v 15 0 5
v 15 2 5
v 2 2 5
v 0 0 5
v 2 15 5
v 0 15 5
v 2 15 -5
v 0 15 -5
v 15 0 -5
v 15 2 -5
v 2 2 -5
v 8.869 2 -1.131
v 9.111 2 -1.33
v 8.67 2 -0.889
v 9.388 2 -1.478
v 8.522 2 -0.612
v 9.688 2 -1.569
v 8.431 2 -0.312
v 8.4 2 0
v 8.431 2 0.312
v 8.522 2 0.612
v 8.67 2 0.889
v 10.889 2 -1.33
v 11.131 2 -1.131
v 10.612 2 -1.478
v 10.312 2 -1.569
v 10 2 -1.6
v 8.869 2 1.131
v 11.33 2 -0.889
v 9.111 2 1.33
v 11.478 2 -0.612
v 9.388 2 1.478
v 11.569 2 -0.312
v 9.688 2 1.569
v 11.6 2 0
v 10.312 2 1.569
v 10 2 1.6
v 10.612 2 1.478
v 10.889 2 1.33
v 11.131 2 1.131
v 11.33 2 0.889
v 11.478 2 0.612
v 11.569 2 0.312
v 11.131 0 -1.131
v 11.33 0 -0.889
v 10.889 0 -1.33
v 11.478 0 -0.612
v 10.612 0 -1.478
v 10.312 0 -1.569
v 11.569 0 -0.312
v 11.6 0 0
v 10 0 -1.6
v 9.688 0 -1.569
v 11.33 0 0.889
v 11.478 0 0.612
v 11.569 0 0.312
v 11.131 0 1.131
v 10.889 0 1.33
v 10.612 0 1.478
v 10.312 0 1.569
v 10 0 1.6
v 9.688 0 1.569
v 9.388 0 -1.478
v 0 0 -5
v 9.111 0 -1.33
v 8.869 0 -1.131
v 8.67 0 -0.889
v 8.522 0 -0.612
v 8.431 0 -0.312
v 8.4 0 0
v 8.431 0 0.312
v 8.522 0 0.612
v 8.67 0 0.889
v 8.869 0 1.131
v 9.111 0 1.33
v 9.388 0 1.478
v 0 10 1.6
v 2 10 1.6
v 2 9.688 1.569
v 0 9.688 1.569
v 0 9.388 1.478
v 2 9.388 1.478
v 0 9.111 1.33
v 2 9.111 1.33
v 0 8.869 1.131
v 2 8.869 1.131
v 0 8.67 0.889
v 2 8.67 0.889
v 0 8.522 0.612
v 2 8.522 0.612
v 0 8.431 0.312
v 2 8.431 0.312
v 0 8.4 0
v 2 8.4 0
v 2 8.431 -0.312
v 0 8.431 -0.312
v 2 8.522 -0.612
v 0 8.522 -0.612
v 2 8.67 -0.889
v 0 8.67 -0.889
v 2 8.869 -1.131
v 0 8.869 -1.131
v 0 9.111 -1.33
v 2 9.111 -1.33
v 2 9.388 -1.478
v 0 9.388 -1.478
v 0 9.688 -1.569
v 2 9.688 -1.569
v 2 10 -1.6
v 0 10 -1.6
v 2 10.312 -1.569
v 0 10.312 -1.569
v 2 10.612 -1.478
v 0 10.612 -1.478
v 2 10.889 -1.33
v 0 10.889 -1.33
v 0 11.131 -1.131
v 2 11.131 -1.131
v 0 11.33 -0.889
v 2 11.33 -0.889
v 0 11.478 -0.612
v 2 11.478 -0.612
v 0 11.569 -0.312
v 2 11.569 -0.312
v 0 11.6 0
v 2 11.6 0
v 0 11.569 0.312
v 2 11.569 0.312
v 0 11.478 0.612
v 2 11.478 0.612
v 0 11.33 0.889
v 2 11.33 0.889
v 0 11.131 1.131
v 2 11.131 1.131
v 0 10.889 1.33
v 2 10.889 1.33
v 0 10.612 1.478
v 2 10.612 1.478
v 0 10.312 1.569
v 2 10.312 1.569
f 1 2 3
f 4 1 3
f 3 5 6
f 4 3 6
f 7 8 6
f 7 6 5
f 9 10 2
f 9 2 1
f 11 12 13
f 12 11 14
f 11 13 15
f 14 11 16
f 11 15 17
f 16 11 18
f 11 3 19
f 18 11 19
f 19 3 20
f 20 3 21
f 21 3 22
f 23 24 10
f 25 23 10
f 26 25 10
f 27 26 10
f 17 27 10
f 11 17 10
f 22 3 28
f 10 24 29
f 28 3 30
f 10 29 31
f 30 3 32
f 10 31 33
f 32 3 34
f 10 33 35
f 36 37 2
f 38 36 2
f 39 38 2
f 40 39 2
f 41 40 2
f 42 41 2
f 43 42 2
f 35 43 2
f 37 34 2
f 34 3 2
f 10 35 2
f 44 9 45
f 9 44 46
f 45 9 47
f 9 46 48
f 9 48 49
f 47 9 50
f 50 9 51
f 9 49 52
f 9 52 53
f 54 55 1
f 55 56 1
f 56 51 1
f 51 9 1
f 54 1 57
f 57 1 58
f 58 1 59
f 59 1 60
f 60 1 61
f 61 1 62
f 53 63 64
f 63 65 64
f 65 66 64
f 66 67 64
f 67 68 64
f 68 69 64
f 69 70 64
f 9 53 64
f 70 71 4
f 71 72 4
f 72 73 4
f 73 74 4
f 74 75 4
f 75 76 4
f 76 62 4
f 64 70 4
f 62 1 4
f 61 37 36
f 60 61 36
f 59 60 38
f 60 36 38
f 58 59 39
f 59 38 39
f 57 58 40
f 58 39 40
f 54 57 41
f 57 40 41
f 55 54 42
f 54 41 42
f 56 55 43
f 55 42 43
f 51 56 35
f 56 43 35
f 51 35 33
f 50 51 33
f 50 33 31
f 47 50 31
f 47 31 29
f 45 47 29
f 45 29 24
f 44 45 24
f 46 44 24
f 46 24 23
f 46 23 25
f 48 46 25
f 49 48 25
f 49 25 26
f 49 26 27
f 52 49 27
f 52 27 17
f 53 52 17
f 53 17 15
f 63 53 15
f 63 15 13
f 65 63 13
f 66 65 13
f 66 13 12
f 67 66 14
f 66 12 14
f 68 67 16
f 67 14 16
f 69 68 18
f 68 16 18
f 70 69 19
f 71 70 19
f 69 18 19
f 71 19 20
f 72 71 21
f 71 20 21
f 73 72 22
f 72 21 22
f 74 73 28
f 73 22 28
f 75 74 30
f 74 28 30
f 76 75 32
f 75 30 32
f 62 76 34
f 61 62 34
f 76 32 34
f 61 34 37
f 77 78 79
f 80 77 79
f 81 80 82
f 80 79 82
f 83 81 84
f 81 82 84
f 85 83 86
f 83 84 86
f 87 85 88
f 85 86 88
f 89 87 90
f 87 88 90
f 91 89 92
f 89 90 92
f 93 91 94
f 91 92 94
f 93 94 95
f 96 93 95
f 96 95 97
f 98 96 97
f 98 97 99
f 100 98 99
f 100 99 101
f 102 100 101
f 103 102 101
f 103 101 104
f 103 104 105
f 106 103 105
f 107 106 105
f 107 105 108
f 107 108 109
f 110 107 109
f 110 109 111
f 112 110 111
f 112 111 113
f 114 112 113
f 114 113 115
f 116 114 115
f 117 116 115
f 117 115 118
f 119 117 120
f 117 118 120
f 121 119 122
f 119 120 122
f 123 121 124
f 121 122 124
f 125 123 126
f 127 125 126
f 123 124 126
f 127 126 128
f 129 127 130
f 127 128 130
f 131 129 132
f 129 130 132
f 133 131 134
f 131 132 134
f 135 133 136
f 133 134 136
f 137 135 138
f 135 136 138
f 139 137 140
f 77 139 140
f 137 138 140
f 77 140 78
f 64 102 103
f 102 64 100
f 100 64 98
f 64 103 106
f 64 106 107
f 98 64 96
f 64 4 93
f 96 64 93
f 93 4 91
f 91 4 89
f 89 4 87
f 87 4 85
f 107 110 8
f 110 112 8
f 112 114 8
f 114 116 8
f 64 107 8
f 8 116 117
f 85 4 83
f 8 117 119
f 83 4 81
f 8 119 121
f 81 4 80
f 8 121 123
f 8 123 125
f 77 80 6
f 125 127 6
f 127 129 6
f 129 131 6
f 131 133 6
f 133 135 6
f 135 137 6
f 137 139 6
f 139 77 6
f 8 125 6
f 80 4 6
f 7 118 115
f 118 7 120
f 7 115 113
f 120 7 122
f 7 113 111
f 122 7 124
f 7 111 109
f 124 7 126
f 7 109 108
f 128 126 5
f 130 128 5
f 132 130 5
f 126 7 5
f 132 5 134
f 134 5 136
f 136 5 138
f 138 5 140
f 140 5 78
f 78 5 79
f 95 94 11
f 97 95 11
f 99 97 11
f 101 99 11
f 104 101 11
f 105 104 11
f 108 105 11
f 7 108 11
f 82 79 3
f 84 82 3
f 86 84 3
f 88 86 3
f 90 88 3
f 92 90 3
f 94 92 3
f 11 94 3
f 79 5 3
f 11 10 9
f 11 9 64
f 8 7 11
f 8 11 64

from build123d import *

# Parameters (mm, degrees)
BASE_DEPTH                       = 5
F_3_2_3_2_MOUNTHOLES_D           = 3.2
F_3_2_3_2_MOUNTHOLES_ON_FACE_2_D = 3.2


with BuildPart() as part:
    # Sketch1 → Base (new body, symmetric)
    with BuildSketch(Plane.XY):
        Polygon((0, 0), (0, 15), (2, 15), (2, 2), (15, 2), (15, 0), align=None)
    extrude(amount=BASE_DEPTH, both=True)

    # Ø3.2 (3.2) MountHoles (through all)
    with Locations(Plane(origin=(0, 10, 0), x_dir=(0, 0, -1), z_dir=(-1, 0, 0))):
        with Locations((0, 0)):
            Hole(F_3_2_3_2_MOUNTHOLES_D / 2)

    # Ø3.2 (3.2) MountHoles on face 2 (through all)
    with Locations(Plane(origin=(10, 0, 0), x_dir=(0, 0, -1), z_dir=(0, -1, 0))):
        with Locations((0, 0)):
            Hole(F_3_2_3_2_MOUNTHOLES_ON_FACE_2_D / 2)


solid = part.part
